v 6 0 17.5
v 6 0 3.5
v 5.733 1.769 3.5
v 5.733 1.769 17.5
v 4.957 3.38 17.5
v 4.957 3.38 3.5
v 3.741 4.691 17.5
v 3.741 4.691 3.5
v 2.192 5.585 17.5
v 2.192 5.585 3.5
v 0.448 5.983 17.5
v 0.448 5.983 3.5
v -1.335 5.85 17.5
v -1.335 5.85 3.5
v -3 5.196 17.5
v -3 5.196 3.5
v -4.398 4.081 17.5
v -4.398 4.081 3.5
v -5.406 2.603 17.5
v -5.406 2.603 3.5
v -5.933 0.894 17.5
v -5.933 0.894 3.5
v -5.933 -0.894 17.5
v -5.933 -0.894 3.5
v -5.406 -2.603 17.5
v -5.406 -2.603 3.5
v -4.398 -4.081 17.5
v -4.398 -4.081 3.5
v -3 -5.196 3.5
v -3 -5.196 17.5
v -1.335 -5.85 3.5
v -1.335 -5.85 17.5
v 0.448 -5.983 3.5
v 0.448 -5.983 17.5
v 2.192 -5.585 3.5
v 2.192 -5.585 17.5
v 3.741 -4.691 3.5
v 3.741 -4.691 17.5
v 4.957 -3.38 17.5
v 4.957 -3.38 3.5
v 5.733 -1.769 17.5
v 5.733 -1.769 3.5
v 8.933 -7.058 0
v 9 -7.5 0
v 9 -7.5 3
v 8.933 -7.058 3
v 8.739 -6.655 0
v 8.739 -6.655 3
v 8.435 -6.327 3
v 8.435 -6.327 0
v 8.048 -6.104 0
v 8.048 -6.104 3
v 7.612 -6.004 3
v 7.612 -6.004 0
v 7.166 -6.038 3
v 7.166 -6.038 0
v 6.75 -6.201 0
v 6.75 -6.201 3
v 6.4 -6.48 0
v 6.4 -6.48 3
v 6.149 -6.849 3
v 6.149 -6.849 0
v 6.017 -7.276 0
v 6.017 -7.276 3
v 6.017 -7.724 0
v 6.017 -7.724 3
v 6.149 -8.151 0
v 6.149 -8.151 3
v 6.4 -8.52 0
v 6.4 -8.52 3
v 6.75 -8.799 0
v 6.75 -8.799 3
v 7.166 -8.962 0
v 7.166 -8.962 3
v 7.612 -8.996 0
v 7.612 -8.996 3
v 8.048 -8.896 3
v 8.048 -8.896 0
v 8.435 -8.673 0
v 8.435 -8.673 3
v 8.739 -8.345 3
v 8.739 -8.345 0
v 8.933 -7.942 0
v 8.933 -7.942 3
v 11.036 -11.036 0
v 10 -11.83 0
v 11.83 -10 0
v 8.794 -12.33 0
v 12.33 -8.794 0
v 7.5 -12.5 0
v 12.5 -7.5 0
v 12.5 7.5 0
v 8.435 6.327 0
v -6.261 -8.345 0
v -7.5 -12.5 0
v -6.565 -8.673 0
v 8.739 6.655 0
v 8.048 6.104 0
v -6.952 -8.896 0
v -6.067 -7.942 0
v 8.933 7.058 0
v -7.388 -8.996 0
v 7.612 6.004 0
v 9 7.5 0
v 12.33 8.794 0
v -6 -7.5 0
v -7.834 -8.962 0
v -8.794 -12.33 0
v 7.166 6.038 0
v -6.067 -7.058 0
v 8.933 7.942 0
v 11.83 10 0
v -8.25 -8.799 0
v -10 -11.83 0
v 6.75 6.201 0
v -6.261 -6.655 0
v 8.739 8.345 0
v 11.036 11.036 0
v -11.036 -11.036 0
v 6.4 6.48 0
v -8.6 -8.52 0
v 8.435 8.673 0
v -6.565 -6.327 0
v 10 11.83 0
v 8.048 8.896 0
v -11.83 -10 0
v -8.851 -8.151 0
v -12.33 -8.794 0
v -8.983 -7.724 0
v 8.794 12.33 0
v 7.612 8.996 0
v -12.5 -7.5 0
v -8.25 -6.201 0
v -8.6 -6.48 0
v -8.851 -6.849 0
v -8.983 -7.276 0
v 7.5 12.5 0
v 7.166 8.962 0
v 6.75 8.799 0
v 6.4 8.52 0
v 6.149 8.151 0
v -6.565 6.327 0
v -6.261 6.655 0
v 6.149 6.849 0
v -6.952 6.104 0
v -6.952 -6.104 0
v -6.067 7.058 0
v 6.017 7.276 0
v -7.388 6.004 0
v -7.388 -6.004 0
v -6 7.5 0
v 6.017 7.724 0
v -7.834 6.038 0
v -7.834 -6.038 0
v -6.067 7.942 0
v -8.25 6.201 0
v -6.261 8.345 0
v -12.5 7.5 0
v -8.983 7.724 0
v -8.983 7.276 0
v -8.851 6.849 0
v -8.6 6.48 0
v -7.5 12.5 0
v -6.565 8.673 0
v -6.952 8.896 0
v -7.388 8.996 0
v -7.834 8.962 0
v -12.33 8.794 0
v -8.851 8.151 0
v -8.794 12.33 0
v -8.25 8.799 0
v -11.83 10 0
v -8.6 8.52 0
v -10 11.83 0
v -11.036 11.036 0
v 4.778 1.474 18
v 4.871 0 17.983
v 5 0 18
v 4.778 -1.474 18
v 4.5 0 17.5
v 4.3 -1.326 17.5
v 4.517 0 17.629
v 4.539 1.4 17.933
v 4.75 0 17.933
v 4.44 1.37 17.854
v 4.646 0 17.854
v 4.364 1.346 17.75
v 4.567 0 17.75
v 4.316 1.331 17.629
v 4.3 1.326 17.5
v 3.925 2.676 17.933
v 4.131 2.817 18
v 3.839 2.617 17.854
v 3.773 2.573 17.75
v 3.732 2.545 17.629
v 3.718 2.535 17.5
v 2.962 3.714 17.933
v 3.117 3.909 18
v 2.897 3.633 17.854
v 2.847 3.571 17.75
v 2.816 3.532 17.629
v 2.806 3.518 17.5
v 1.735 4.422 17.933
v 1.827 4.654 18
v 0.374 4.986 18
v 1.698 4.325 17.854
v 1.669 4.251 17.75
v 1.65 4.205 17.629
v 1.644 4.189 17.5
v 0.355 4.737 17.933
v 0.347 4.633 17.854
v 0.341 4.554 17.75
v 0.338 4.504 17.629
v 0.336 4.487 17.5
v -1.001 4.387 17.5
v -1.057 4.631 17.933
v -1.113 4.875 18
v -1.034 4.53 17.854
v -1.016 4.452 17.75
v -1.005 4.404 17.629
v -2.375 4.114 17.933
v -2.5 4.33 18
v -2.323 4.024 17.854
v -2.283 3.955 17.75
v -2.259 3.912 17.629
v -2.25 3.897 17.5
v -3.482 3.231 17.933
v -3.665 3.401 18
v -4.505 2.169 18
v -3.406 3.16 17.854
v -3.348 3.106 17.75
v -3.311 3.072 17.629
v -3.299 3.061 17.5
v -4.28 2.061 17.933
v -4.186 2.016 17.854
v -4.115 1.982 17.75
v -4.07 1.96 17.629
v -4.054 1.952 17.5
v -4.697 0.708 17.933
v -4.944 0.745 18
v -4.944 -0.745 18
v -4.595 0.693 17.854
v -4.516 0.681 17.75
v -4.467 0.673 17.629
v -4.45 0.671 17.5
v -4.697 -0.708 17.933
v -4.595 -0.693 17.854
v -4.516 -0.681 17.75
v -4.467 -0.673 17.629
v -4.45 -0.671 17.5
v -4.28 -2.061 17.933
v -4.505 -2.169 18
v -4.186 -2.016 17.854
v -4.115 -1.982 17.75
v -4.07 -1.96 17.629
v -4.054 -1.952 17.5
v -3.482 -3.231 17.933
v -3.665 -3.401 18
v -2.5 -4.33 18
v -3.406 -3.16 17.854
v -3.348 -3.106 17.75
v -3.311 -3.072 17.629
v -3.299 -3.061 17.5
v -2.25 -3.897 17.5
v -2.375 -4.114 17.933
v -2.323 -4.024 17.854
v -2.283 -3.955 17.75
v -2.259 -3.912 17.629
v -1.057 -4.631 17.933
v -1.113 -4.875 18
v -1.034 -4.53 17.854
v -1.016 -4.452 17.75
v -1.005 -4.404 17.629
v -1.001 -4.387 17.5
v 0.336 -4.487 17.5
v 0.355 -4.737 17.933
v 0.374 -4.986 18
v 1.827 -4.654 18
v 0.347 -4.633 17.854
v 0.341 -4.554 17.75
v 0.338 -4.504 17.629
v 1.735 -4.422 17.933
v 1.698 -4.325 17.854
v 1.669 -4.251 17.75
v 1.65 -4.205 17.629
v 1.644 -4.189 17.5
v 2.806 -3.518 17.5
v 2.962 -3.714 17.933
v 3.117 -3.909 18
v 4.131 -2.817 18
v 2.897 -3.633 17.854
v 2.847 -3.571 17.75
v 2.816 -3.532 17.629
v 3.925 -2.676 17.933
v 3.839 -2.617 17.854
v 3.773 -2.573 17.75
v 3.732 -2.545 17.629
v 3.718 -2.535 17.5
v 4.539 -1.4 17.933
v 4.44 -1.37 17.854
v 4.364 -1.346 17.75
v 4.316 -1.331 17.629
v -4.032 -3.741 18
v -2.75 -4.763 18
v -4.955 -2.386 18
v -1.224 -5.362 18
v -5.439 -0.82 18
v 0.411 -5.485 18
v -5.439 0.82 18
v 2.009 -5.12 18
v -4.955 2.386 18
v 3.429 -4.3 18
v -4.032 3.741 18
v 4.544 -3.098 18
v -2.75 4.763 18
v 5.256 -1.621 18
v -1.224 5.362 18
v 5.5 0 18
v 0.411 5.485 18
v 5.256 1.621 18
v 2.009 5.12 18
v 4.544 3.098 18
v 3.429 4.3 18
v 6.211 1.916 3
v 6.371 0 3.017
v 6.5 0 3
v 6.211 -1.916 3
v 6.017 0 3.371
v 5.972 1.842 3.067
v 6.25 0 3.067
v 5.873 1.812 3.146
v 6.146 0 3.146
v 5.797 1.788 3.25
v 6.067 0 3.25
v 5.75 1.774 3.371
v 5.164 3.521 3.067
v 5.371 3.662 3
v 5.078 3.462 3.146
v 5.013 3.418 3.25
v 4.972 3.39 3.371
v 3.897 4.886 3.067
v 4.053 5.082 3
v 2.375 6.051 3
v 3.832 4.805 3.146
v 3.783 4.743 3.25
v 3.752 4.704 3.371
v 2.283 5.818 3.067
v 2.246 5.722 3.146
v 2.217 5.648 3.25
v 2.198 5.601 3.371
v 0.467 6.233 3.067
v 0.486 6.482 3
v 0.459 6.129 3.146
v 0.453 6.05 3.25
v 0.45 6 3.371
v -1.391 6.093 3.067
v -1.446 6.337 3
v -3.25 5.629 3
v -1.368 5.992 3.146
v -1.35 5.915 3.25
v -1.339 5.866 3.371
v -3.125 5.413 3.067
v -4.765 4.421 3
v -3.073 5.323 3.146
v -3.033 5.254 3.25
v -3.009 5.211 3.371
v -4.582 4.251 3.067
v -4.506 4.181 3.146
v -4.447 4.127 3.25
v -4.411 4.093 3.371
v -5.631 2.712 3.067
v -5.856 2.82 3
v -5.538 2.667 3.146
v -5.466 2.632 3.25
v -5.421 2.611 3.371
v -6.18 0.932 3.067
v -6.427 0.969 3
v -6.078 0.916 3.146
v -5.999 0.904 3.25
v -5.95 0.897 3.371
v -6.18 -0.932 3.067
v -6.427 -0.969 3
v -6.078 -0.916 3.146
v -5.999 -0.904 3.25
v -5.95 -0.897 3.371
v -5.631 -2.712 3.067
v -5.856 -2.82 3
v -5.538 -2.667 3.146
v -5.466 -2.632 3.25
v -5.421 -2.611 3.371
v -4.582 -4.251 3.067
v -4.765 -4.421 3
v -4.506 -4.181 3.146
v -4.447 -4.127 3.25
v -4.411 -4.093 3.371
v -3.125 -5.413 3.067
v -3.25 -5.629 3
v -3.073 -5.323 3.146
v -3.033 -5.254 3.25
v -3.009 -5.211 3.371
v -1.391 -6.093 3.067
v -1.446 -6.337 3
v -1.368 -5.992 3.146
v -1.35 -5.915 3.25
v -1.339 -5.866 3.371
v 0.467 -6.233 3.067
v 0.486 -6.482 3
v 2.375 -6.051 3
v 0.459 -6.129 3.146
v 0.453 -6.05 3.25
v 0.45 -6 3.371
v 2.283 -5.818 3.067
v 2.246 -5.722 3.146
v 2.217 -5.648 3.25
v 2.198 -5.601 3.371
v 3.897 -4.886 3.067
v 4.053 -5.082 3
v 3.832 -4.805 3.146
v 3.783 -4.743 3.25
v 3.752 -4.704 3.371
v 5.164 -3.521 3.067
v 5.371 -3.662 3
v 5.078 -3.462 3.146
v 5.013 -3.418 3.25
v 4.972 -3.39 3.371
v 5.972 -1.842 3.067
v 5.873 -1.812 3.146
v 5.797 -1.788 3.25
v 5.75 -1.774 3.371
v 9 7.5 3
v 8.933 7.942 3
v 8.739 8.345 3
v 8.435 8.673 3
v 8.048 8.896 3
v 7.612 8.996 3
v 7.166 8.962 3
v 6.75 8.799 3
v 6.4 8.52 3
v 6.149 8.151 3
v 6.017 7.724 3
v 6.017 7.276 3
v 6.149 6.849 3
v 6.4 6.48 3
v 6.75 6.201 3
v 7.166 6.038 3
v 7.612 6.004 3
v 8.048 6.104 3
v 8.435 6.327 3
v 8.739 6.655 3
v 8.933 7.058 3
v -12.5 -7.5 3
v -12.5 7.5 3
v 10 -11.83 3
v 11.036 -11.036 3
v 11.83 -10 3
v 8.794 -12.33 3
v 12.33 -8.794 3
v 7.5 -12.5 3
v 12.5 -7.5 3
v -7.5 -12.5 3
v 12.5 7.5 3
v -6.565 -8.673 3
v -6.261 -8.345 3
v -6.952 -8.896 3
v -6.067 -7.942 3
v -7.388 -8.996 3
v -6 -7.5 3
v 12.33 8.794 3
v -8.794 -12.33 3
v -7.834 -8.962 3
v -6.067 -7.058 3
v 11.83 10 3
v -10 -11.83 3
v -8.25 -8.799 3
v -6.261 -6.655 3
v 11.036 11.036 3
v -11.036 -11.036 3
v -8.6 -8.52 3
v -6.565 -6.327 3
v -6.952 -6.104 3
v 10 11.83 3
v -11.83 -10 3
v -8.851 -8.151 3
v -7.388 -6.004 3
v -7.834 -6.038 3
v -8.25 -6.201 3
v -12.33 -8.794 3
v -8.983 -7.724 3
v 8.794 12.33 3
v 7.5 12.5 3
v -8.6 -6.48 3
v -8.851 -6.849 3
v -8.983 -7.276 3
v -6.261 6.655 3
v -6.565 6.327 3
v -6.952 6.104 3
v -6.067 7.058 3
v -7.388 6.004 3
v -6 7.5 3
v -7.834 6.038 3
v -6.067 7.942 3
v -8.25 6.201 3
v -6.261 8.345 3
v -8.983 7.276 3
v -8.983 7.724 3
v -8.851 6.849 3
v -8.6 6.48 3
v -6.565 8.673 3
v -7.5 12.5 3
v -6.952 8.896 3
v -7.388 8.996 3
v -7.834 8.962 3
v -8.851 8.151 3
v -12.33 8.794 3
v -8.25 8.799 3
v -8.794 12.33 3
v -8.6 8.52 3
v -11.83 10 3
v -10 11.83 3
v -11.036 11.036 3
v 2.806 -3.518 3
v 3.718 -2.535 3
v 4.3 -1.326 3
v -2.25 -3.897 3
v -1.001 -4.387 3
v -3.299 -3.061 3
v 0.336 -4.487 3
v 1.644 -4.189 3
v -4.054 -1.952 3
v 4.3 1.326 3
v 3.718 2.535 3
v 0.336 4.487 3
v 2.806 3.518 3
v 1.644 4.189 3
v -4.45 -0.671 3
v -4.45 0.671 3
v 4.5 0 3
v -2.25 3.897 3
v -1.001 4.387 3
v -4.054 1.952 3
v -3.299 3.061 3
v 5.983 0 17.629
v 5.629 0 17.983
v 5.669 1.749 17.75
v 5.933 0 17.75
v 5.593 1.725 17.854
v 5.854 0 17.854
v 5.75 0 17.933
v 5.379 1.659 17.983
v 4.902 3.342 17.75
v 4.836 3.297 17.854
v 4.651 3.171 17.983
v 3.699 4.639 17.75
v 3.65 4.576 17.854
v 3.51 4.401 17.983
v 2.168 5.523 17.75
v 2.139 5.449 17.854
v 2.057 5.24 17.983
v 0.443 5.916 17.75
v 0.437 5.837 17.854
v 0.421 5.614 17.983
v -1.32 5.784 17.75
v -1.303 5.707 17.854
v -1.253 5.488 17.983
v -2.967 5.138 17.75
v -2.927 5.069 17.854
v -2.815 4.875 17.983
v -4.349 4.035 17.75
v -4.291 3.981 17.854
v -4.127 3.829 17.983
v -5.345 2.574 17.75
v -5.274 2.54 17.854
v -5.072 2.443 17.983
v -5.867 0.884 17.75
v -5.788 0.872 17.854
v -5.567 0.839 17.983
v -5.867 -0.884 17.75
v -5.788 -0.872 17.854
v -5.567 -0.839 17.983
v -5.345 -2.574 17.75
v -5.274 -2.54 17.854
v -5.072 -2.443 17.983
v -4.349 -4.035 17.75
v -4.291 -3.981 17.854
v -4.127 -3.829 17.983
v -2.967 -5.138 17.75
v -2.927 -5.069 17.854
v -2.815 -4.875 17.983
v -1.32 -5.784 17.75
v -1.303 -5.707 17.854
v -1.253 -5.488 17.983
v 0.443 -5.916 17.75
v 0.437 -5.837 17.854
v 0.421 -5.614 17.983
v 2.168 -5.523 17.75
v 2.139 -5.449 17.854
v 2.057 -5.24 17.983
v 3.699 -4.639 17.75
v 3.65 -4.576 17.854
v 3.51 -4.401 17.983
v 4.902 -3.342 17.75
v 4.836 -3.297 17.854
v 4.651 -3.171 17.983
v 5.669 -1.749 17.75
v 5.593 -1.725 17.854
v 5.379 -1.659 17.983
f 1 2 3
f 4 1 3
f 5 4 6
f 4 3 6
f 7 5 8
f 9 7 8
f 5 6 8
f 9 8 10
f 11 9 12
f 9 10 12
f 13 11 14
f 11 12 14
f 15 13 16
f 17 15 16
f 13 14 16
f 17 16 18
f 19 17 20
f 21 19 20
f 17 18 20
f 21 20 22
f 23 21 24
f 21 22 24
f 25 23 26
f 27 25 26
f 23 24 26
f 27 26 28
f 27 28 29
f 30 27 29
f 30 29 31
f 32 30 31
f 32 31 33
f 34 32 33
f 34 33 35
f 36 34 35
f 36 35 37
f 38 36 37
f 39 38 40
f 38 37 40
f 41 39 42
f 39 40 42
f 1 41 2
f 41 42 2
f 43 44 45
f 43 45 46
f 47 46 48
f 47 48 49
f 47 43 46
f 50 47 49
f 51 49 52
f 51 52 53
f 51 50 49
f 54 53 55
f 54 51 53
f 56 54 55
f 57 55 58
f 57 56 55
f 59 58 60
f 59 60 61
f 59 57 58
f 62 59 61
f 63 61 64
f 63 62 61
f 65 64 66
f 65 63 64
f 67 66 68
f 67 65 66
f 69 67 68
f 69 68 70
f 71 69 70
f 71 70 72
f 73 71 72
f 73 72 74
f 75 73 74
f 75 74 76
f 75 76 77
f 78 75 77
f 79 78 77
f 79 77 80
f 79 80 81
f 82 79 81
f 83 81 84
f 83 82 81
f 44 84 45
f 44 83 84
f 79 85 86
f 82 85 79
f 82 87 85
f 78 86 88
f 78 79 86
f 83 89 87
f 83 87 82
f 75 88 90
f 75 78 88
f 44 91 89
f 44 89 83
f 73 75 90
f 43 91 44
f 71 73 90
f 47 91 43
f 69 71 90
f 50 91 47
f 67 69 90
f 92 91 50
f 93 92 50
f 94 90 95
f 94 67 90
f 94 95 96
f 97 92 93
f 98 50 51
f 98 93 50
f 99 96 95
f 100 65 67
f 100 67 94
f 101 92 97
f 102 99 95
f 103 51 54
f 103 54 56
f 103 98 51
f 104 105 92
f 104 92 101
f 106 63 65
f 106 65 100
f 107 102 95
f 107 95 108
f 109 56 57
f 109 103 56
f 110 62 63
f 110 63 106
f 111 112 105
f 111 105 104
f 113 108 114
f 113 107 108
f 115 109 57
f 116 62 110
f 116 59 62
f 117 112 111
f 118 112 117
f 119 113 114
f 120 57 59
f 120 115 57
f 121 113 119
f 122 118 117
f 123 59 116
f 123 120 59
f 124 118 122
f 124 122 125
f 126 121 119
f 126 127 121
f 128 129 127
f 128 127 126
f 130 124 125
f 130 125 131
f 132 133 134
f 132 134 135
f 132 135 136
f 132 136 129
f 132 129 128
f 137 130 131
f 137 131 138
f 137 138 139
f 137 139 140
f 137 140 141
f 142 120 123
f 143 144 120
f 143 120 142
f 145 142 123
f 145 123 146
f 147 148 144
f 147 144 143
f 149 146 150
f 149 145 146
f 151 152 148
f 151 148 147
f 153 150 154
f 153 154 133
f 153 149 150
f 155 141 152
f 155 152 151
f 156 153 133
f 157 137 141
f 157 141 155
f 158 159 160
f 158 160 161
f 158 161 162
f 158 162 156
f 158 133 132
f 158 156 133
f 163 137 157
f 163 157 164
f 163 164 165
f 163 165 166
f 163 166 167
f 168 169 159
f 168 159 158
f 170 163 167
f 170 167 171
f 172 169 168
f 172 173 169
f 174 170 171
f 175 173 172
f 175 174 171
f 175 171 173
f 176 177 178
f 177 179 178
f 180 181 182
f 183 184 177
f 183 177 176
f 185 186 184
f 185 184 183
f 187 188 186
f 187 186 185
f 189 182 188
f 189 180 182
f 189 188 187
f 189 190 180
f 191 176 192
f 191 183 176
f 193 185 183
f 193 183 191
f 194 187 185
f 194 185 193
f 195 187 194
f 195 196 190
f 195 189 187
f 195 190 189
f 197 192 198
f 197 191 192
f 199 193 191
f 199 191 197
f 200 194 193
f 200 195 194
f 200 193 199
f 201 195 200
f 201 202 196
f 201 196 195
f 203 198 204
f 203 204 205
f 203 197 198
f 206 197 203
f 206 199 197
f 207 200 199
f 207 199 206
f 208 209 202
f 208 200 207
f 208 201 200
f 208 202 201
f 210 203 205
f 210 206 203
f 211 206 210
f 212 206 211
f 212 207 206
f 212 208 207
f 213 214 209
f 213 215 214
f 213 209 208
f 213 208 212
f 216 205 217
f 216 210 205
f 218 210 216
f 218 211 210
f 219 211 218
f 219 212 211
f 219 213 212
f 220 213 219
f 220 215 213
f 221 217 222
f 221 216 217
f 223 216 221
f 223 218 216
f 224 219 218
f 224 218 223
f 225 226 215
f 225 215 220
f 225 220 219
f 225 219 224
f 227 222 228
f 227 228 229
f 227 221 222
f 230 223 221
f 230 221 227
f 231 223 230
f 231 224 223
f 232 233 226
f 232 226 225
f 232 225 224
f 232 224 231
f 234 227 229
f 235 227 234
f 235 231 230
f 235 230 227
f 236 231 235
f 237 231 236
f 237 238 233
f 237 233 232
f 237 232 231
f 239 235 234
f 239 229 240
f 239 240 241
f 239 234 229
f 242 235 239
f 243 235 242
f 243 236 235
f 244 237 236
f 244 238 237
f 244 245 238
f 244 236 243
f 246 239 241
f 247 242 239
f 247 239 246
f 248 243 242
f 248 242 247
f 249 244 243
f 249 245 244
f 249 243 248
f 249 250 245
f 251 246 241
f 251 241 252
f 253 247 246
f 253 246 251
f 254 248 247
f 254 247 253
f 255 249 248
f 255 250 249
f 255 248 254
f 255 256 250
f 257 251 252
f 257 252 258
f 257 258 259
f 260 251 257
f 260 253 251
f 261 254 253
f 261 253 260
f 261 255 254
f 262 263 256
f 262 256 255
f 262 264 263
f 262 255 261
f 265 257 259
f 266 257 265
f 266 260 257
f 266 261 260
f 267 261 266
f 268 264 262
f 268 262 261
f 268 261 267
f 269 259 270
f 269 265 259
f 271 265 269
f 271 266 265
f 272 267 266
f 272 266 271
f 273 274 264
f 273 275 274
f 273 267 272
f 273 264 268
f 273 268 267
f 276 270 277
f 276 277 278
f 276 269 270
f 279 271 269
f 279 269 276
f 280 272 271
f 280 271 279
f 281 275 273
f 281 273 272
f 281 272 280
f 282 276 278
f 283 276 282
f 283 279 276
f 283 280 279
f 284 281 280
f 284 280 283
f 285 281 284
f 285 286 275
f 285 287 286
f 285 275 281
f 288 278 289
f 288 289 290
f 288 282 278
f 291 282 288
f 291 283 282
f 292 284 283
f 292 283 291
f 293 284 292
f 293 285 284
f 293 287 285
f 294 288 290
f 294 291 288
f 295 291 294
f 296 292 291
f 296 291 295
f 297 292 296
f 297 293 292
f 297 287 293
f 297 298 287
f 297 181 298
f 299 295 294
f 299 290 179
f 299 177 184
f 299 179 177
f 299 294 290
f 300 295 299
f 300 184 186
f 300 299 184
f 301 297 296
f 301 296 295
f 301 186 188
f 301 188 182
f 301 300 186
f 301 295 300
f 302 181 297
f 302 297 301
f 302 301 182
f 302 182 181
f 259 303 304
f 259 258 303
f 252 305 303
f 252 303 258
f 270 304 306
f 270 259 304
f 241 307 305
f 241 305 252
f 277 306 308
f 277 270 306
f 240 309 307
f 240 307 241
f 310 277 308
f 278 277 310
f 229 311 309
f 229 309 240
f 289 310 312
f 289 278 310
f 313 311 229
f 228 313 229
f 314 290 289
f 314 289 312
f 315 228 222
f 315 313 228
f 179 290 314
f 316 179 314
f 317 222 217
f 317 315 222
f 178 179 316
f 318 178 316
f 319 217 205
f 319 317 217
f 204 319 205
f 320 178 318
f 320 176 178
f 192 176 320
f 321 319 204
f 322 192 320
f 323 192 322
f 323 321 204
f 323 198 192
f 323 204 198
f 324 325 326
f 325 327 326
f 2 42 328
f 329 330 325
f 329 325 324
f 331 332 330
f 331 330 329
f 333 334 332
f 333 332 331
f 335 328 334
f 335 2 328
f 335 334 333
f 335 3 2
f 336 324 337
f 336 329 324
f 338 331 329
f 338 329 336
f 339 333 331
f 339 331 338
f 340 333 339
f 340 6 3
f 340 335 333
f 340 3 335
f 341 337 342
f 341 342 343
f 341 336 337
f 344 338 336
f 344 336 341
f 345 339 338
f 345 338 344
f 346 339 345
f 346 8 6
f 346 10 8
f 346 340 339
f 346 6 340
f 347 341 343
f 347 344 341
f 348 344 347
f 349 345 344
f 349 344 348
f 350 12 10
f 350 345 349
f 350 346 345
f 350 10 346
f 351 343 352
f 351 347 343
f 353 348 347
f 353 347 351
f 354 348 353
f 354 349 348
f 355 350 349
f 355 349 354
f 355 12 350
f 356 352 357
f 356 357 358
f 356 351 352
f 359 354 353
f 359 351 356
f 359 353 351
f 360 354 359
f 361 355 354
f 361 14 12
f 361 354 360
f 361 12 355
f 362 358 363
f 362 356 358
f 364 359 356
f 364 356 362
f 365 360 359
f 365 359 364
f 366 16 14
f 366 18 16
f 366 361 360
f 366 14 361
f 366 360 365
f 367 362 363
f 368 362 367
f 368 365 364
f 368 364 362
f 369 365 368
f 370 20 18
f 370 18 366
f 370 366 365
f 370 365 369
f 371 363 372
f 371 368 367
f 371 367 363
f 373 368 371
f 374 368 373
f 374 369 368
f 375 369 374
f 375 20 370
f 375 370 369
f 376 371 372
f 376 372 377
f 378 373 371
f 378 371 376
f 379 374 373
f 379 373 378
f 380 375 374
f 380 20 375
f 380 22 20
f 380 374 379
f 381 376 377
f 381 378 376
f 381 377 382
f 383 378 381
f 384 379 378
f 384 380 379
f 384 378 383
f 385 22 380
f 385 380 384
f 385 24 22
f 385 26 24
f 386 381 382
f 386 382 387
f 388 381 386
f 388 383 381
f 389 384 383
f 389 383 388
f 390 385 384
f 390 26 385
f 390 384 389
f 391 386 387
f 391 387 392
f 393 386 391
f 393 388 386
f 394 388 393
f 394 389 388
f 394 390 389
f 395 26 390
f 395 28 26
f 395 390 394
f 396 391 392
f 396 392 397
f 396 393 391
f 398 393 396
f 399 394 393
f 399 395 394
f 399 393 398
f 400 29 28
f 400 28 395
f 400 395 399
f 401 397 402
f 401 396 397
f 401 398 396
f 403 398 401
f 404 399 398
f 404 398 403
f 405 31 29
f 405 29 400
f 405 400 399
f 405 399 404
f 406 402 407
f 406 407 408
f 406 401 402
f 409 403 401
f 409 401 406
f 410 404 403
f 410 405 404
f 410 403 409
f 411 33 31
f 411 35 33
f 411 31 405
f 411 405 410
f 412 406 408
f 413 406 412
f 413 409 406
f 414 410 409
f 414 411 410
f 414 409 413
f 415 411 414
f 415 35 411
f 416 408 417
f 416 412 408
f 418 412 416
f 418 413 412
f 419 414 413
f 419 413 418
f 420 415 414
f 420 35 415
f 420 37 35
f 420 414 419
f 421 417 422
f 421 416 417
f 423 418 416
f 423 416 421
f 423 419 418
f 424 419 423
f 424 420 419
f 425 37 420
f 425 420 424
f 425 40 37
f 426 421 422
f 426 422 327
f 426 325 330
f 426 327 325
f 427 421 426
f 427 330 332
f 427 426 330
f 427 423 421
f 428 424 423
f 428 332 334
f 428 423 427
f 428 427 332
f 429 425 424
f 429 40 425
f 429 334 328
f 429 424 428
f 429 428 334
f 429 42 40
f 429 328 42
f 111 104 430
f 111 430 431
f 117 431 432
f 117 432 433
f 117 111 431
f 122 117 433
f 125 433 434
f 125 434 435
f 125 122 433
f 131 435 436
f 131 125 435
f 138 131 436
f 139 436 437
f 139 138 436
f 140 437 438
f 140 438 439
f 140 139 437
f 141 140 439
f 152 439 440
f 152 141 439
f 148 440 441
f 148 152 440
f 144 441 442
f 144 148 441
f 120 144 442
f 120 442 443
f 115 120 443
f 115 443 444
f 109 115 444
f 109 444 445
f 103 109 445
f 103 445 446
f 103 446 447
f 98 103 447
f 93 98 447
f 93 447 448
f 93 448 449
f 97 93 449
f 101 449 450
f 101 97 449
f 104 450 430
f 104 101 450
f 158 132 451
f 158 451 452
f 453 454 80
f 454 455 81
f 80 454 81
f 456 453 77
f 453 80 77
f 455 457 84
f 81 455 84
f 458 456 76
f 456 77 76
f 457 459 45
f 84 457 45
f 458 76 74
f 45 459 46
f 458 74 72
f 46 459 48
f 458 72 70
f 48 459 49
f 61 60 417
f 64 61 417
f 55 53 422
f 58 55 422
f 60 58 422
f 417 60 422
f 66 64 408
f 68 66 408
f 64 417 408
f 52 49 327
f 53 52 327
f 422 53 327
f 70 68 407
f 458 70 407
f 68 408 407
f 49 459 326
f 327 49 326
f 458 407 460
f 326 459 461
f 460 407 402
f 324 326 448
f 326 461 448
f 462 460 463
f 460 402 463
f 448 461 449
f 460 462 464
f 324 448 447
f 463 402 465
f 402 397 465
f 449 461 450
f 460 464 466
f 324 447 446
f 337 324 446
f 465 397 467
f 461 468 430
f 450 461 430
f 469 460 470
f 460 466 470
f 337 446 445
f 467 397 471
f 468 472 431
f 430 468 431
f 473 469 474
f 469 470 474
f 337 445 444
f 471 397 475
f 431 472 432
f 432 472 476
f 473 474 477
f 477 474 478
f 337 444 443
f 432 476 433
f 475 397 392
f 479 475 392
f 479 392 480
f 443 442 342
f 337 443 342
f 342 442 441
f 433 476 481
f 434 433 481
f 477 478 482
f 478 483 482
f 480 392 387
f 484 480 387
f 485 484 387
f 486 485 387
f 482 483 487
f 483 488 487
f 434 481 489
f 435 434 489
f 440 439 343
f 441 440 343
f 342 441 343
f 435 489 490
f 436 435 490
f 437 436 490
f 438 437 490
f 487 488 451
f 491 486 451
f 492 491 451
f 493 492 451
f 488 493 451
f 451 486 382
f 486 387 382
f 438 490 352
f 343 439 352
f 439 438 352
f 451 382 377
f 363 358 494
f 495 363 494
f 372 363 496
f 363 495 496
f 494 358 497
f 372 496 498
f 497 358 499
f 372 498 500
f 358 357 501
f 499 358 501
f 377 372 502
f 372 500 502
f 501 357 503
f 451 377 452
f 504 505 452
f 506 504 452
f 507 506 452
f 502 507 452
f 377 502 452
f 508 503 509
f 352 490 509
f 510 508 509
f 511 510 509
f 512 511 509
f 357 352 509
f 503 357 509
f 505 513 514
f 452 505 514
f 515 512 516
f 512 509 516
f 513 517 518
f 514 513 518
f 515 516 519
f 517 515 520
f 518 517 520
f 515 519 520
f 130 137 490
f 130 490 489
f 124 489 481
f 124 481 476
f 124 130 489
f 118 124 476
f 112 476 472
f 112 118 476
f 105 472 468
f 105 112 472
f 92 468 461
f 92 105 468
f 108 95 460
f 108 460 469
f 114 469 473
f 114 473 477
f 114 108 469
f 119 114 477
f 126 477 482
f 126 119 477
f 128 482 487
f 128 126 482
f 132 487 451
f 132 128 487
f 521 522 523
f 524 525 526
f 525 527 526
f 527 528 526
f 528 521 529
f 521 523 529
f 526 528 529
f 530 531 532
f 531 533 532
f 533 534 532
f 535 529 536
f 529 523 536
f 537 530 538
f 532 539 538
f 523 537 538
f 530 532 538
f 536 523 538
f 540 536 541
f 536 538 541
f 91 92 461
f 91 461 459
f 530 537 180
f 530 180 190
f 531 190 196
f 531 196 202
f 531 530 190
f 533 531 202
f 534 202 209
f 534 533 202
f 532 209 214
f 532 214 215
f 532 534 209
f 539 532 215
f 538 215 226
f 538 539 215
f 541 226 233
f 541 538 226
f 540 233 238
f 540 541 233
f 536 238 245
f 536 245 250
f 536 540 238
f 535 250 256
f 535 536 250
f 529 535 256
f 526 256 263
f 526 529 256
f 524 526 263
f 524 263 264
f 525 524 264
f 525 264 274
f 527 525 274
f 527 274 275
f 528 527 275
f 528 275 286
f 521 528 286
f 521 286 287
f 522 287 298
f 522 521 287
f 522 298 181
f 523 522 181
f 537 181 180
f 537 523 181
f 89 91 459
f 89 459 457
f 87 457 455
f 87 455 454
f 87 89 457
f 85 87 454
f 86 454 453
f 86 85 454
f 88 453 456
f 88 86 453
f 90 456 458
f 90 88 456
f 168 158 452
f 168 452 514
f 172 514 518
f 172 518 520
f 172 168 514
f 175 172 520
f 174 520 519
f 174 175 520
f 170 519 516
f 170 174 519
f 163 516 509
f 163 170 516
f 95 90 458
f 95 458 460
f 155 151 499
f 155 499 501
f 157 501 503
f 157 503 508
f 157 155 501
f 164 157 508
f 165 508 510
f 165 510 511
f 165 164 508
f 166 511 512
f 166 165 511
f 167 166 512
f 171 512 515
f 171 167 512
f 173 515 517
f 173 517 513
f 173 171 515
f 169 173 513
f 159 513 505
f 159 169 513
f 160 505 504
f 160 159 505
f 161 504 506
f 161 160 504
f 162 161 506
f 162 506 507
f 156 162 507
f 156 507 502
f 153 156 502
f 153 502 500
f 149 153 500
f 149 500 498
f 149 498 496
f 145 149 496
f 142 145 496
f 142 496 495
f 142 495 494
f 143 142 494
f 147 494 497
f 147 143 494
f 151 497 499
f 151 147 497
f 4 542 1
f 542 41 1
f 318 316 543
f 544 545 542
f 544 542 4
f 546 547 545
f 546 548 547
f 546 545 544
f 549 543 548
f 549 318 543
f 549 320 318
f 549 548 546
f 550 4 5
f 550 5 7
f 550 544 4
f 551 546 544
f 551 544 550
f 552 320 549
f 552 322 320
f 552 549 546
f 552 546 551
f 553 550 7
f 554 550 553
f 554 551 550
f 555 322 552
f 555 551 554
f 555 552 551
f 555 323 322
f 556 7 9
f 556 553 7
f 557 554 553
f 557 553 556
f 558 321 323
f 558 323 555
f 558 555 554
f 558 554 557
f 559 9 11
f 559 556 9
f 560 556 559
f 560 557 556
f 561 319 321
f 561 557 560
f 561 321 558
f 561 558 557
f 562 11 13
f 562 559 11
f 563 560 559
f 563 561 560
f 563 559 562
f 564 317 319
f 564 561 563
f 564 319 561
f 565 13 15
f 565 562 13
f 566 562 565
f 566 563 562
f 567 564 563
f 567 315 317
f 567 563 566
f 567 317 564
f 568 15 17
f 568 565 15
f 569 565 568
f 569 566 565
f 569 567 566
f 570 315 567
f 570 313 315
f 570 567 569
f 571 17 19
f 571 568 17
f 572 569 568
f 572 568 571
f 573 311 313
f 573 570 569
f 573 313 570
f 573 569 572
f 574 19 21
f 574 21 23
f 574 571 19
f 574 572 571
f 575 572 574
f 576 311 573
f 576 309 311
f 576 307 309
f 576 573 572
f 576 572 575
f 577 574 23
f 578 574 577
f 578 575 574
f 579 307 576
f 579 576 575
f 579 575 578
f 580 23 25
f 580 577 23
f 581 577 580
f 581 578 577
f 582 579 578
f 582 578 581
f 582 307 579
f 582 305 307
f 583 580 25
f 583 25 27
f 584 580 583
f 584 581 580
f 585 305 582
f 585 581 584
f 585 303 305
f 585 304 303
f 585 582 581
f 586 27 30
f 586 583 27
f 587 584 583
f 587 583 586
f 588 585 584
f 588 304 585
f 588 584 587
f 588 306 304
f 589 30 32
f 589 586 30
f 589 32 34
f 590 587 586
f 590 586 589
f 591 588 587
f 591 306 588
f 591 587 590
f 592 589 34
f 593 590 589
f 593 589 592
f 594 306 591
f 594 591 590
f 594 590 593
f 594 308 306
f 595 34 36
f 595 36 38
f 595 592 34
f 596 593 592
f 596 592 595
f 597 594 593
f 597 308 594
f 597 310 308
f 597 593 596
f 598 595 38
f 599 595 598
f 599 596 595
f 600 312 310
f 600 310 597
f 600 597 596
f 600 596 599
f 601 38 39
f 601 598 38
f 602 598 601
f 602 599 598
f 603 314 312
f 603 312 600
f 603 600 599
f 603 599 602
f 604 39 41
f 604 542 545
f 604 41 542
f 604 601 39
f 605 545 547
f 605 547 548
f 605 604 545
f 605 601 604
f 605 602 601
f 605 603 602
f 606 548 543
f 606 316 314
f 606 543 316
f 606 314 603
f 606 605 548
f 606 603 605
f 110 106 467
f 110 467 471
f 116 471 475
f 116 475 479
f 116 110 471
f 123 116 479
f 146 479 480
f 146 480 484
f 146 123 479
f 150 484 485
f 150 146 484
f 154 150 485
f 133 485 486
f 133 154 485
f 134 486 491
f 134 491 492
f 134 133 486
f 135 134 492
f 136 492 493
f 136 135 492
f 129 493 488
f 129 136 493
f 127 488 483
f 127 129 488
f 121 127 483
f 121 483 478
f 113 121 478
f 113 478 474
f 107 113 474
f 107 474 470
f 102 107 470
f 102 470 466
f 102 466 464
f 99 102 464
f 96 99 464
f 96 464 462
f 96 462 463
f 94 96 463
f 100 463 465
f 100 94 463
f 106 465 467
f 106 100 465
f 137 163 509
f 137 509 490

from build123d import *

# Parameters (mm, degrees)
ESQUISSE1_R        = 1.5
BOSS_EXTRU_1_DEPTH = 3
ESQUISSE2_R        = 6
ESQUISSE2_R_2      = 4.5
BOSS_EXTRU_2_DEPTH = 15
CONG_1_R           = 0.5


with BuildPart() as part:
    # Esquisse1 → Boss.-Extru.1 (new body)
    with BuildSketch(Plane.XY):
        with BuildLine():
            Line((7.5, -12.5), (-7.5, -12.5))
            ThreePointArc((-7.5, -12.5), (-11.035533906, -11.035533906), (-12.5, -7.5))
            Line((-12.5, -7.5), (-12.5, 7.5))
            ThreePointArc((-12.5, 7.5), (-11.035533906, 11.035533906), (-7.5, 12.5))
            Line((-7.5, 12.5), (7.5, 12.5))
            ThreePointArc((7.5, 12.5), (11.035533906, 11.035533906), (12.5, 7.5))
            Line((12.5, 7.5), (12.5, -7.5))
            ThreePointArc((12.5, -7.5), (11.035533906, -11.035533906), (7.5, -12.5))
        make_face()
        with Locations((-7.5, 7.5)):
            Circle(ESQUISSE1_R, mode=Mode.SUBTRACT)
        with Locations((7.5, 7.5)):
            Circle(ESQUISSE1_R, mode=Mode.SUBTRACT)
        with Locations((7.5, -7.5)):
            Circle(ESQUISSE1_R, mode=Mode.SUBTRACT)
        with Locations((-7.5, -7.5)):
            Circle(ESQUISSE1_R, mode=Mode.SUBTRACT)
    extrude(amount=BOSS_EXTRU_1_DEPTH)

    # Esquisse2 → Boss.-Extru.2 (add)
    with BuildSketch(Plane.XY.offset(3)):
        Circle(ESQUISSE2_R)
        Circle(ESQUISSE2_R_2, mode=Mode.SUBTRACT)
    extrude(amount=BOSS_EXTRU_2_DEPTH)

    # Congé1
    cong_1_edges = [part.edges().sort_by_distance(p)[0] for p in [
        (-6, 0, 18),
        (-6, 0, 3),
        (-4.5, 0, 18),
    ]]
    fillet(cong_1_edges, radius=CONG_1_R)


solid = part.part
